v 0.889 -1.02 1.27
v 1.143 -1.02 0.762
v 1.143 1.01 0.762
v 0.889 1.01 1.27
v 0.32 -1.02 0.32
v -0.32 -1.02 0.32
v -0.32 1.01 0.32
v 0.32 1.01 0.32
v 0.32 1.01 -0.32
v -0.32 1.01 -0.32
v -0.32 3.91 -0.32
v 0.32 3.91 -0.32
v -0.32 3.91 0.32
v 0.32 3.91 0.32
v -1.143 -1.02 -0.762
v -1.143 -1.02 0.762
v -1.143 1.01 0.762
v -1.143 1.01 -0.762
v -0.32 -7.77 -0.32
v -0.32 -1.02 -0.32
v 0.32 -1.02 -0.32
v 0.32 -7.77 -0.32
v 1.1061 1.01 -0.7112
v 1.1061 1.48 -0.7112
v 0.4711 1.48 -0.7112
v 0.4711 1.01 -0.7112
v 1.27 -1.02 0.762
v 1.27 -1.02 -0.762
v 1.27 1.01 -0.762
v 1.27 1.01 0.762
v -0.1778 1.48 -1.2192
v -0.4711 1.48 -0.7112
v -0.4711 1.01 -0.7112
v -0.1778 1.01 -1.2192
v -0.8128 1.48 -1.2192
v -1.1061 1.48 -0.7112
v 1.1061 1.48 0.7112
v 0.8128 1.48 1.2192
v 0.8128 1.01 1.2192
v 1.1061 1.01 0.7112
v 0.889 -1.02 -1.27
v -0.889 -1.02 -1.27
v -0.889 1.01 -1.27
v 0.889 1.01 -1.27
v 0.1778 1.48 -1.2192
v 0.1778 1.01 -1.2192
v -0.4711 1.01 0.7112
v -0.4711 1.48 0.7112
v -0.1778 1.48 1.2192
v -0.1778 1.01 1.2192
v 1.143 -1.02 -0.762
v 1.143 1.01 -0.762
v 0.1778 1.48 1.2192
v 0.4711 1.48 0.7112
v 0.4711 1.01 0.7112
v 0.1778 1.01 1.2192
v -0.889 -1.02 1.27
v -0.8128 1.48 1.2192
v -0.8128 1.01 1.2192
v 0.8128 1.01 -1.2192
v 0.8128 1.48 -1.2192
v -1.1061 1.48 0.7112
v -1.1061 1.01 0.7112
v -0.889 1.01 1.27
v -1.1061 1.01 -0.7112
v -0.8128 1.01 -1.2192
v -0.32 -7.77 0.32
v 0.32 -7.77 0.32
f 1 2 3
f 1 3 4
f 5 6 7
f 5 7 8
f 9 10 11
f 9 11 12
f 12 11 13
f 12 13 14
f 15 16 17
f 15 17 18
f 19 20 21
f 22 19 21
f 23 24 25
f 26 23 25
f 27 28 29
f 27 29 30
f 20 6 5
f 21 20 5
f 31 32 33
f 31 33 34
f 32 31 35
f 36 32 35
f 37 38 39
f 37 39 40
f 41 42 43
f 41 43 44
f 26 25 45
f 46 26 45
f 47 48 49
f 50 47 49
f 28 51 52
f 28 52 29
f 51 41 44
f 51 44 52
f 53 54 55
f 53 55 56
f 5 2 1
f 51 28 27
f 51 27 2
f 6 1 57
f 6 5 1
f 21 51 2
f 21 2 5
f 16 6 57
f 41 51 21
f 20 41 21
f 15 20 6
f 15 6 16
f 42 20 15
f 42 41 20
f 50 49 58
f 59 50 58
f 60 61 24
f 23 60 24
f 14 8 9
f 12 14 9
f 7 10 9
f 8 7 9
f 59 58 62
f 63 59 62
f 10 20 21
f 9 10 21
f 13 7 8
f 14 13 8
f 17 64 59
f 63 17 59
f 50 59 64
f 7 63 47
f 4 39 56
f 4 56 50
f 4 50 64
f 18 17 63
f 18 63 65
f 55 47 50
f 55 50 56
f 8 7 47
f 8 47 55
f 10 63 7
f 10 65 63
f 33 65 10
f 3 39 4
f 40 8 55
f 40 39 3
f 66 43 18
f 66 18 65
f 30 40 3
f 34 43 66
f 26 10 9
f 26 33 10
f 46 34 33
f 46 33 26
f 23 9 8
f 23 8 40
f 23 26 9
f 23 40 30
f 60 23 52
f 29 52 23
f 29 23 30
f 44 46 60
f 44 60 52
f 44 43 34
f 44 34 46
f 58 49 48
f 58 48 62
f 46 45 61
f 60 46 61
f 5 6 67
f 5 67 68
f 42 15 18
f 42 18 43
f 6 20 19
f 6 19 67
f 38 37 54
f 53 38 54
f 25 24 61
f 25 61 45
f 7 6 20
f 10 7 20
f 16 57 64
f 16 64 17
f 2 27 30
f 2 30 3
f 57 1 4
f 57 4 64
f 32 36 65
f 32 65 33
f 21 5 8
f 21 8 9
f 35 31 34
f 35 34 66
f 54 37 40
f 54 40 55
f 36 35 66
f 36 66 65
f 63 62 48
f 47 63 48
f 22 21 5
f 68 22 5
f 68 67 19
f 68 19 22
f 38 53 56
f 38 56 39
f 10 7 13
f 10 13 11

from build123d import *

# Parameters (mm, degrees)
BOSS_EXTRUDE1_DEPTH      = 1.48
BOSS_EXTRUDE1_DEPTH_BACK = 1.02
SKETCH1_W                = 0.64
SKETCH1_H                = 0.64
SKETCH2_OUTSIDE_W        = 5.273
SKETCH2_OUTSIDE_H        = 5.4
CUT_EXTRUDE2_DEPTH       = 0.47
SKETCH3_W                = 0.64
SKETCH3_H                = 0.64
BOSS_EXTRUDE2_DEPTH      = 2.9
SKETCH4_W                = 0.64
SKETCH4_H                = 0.64
BOSS_EXTRUDE3_DEPTH      = 6.75


with BuildPart() as part:
    # Sketch1 → Boss-Extrude1 (new, two sides: drawn at the far end of the back side and taken through both)
    with BuildSketch(Plane(origin=(0, 0, 0), x_dir=(1, 0, 0), z_dir=(0, 1, 0)).offset(-BOSS_EXTRUDE1_DEPTH_BACK)):
        Polygon((-1.143, 0.762), (-0.889, 1.27), (0.889, 1.27), (1.143, 0.762), (1.27, 0.762), (1.27, -0.762), (1.143, -0.762), (0.889, -1.27), (-0.889, -1.27), (-1.143, -0.762), align=None)
        Rectangle(SKETCH1_W, SKETCH1_H, mode=Mode.SUBTRACT)
    extrude(amount=BOSS_EXTRUDE1_DEPTH + BOSS_EXTRUDE1_DEPTH_BACK)

    # Sketch2 outside → Cut-Extrude2 (cut)
    with BuildSketch(Plane(origin=(0, 1.48, 0), x_dir=(1, 0, 0), z_dir=(0, 1, 0))):
        with Locations((0.0635, 0)):
            Rectangle(SKETCH2_OUTSIDE_W, SKETCH2_OUTSIDE_H)
        Polygon((-1.106093937, -0.7112), (-0.471093937, -0.7112), (-0.1778, -1.2192), (-0.8128, -1.2192), align=None, mode=Mode.SUBTRACT)
        Polygon((-0.8128, 1.2192), (-1.106093937, 0.7112), (-0.471093937, 0.7112), (-0.1778, 1.2192), align=None, mode=Mode.SUBTRACT)
        Polygon((1.106093937, 0.7112), (0.471093937, 0.7112), (0.1778, 1.2192), (0.8128, 1.2192), align=None, mode=Mode.SUBTRACT)
        Polygon((0.8128, -1.2192), (1.106093937, -0.7112), (0.471093937, -0.7112), (0.1778, -1.2192), align=None, mode=Mode.SUBTRACT)
    extrude(amount=-CUT_EXTRUDE2_DEPTH, mode=Mode.SUBTRACT)


with BuildPart() as body_2:
    # Sketch3 → Boss-Extrude2 (new body)
    with BuildSketch(Plane(origin=(0, 1.01, 0), x_dir=(1, 0, 0), z_dir=(0, 1, 0))):
        Rectangle(SKETCH3_W, SKETCH3_H)
    extrude(amount=BOSS_EXTRUDE2_DEPTH)


with BuildPart() as body_3:
    # Sketch4 → Boss-Extrude3 (new body)
    with BuildSketch(Plane.XZ.offset(1.02)):
        Rectangle(SKETCH4_W, SKETCH4_H)
    extrude(amount=BOSS_EXTRUDE3_DEPTH)


solid = Compound([part.part, body_2.part, body_3.part])
